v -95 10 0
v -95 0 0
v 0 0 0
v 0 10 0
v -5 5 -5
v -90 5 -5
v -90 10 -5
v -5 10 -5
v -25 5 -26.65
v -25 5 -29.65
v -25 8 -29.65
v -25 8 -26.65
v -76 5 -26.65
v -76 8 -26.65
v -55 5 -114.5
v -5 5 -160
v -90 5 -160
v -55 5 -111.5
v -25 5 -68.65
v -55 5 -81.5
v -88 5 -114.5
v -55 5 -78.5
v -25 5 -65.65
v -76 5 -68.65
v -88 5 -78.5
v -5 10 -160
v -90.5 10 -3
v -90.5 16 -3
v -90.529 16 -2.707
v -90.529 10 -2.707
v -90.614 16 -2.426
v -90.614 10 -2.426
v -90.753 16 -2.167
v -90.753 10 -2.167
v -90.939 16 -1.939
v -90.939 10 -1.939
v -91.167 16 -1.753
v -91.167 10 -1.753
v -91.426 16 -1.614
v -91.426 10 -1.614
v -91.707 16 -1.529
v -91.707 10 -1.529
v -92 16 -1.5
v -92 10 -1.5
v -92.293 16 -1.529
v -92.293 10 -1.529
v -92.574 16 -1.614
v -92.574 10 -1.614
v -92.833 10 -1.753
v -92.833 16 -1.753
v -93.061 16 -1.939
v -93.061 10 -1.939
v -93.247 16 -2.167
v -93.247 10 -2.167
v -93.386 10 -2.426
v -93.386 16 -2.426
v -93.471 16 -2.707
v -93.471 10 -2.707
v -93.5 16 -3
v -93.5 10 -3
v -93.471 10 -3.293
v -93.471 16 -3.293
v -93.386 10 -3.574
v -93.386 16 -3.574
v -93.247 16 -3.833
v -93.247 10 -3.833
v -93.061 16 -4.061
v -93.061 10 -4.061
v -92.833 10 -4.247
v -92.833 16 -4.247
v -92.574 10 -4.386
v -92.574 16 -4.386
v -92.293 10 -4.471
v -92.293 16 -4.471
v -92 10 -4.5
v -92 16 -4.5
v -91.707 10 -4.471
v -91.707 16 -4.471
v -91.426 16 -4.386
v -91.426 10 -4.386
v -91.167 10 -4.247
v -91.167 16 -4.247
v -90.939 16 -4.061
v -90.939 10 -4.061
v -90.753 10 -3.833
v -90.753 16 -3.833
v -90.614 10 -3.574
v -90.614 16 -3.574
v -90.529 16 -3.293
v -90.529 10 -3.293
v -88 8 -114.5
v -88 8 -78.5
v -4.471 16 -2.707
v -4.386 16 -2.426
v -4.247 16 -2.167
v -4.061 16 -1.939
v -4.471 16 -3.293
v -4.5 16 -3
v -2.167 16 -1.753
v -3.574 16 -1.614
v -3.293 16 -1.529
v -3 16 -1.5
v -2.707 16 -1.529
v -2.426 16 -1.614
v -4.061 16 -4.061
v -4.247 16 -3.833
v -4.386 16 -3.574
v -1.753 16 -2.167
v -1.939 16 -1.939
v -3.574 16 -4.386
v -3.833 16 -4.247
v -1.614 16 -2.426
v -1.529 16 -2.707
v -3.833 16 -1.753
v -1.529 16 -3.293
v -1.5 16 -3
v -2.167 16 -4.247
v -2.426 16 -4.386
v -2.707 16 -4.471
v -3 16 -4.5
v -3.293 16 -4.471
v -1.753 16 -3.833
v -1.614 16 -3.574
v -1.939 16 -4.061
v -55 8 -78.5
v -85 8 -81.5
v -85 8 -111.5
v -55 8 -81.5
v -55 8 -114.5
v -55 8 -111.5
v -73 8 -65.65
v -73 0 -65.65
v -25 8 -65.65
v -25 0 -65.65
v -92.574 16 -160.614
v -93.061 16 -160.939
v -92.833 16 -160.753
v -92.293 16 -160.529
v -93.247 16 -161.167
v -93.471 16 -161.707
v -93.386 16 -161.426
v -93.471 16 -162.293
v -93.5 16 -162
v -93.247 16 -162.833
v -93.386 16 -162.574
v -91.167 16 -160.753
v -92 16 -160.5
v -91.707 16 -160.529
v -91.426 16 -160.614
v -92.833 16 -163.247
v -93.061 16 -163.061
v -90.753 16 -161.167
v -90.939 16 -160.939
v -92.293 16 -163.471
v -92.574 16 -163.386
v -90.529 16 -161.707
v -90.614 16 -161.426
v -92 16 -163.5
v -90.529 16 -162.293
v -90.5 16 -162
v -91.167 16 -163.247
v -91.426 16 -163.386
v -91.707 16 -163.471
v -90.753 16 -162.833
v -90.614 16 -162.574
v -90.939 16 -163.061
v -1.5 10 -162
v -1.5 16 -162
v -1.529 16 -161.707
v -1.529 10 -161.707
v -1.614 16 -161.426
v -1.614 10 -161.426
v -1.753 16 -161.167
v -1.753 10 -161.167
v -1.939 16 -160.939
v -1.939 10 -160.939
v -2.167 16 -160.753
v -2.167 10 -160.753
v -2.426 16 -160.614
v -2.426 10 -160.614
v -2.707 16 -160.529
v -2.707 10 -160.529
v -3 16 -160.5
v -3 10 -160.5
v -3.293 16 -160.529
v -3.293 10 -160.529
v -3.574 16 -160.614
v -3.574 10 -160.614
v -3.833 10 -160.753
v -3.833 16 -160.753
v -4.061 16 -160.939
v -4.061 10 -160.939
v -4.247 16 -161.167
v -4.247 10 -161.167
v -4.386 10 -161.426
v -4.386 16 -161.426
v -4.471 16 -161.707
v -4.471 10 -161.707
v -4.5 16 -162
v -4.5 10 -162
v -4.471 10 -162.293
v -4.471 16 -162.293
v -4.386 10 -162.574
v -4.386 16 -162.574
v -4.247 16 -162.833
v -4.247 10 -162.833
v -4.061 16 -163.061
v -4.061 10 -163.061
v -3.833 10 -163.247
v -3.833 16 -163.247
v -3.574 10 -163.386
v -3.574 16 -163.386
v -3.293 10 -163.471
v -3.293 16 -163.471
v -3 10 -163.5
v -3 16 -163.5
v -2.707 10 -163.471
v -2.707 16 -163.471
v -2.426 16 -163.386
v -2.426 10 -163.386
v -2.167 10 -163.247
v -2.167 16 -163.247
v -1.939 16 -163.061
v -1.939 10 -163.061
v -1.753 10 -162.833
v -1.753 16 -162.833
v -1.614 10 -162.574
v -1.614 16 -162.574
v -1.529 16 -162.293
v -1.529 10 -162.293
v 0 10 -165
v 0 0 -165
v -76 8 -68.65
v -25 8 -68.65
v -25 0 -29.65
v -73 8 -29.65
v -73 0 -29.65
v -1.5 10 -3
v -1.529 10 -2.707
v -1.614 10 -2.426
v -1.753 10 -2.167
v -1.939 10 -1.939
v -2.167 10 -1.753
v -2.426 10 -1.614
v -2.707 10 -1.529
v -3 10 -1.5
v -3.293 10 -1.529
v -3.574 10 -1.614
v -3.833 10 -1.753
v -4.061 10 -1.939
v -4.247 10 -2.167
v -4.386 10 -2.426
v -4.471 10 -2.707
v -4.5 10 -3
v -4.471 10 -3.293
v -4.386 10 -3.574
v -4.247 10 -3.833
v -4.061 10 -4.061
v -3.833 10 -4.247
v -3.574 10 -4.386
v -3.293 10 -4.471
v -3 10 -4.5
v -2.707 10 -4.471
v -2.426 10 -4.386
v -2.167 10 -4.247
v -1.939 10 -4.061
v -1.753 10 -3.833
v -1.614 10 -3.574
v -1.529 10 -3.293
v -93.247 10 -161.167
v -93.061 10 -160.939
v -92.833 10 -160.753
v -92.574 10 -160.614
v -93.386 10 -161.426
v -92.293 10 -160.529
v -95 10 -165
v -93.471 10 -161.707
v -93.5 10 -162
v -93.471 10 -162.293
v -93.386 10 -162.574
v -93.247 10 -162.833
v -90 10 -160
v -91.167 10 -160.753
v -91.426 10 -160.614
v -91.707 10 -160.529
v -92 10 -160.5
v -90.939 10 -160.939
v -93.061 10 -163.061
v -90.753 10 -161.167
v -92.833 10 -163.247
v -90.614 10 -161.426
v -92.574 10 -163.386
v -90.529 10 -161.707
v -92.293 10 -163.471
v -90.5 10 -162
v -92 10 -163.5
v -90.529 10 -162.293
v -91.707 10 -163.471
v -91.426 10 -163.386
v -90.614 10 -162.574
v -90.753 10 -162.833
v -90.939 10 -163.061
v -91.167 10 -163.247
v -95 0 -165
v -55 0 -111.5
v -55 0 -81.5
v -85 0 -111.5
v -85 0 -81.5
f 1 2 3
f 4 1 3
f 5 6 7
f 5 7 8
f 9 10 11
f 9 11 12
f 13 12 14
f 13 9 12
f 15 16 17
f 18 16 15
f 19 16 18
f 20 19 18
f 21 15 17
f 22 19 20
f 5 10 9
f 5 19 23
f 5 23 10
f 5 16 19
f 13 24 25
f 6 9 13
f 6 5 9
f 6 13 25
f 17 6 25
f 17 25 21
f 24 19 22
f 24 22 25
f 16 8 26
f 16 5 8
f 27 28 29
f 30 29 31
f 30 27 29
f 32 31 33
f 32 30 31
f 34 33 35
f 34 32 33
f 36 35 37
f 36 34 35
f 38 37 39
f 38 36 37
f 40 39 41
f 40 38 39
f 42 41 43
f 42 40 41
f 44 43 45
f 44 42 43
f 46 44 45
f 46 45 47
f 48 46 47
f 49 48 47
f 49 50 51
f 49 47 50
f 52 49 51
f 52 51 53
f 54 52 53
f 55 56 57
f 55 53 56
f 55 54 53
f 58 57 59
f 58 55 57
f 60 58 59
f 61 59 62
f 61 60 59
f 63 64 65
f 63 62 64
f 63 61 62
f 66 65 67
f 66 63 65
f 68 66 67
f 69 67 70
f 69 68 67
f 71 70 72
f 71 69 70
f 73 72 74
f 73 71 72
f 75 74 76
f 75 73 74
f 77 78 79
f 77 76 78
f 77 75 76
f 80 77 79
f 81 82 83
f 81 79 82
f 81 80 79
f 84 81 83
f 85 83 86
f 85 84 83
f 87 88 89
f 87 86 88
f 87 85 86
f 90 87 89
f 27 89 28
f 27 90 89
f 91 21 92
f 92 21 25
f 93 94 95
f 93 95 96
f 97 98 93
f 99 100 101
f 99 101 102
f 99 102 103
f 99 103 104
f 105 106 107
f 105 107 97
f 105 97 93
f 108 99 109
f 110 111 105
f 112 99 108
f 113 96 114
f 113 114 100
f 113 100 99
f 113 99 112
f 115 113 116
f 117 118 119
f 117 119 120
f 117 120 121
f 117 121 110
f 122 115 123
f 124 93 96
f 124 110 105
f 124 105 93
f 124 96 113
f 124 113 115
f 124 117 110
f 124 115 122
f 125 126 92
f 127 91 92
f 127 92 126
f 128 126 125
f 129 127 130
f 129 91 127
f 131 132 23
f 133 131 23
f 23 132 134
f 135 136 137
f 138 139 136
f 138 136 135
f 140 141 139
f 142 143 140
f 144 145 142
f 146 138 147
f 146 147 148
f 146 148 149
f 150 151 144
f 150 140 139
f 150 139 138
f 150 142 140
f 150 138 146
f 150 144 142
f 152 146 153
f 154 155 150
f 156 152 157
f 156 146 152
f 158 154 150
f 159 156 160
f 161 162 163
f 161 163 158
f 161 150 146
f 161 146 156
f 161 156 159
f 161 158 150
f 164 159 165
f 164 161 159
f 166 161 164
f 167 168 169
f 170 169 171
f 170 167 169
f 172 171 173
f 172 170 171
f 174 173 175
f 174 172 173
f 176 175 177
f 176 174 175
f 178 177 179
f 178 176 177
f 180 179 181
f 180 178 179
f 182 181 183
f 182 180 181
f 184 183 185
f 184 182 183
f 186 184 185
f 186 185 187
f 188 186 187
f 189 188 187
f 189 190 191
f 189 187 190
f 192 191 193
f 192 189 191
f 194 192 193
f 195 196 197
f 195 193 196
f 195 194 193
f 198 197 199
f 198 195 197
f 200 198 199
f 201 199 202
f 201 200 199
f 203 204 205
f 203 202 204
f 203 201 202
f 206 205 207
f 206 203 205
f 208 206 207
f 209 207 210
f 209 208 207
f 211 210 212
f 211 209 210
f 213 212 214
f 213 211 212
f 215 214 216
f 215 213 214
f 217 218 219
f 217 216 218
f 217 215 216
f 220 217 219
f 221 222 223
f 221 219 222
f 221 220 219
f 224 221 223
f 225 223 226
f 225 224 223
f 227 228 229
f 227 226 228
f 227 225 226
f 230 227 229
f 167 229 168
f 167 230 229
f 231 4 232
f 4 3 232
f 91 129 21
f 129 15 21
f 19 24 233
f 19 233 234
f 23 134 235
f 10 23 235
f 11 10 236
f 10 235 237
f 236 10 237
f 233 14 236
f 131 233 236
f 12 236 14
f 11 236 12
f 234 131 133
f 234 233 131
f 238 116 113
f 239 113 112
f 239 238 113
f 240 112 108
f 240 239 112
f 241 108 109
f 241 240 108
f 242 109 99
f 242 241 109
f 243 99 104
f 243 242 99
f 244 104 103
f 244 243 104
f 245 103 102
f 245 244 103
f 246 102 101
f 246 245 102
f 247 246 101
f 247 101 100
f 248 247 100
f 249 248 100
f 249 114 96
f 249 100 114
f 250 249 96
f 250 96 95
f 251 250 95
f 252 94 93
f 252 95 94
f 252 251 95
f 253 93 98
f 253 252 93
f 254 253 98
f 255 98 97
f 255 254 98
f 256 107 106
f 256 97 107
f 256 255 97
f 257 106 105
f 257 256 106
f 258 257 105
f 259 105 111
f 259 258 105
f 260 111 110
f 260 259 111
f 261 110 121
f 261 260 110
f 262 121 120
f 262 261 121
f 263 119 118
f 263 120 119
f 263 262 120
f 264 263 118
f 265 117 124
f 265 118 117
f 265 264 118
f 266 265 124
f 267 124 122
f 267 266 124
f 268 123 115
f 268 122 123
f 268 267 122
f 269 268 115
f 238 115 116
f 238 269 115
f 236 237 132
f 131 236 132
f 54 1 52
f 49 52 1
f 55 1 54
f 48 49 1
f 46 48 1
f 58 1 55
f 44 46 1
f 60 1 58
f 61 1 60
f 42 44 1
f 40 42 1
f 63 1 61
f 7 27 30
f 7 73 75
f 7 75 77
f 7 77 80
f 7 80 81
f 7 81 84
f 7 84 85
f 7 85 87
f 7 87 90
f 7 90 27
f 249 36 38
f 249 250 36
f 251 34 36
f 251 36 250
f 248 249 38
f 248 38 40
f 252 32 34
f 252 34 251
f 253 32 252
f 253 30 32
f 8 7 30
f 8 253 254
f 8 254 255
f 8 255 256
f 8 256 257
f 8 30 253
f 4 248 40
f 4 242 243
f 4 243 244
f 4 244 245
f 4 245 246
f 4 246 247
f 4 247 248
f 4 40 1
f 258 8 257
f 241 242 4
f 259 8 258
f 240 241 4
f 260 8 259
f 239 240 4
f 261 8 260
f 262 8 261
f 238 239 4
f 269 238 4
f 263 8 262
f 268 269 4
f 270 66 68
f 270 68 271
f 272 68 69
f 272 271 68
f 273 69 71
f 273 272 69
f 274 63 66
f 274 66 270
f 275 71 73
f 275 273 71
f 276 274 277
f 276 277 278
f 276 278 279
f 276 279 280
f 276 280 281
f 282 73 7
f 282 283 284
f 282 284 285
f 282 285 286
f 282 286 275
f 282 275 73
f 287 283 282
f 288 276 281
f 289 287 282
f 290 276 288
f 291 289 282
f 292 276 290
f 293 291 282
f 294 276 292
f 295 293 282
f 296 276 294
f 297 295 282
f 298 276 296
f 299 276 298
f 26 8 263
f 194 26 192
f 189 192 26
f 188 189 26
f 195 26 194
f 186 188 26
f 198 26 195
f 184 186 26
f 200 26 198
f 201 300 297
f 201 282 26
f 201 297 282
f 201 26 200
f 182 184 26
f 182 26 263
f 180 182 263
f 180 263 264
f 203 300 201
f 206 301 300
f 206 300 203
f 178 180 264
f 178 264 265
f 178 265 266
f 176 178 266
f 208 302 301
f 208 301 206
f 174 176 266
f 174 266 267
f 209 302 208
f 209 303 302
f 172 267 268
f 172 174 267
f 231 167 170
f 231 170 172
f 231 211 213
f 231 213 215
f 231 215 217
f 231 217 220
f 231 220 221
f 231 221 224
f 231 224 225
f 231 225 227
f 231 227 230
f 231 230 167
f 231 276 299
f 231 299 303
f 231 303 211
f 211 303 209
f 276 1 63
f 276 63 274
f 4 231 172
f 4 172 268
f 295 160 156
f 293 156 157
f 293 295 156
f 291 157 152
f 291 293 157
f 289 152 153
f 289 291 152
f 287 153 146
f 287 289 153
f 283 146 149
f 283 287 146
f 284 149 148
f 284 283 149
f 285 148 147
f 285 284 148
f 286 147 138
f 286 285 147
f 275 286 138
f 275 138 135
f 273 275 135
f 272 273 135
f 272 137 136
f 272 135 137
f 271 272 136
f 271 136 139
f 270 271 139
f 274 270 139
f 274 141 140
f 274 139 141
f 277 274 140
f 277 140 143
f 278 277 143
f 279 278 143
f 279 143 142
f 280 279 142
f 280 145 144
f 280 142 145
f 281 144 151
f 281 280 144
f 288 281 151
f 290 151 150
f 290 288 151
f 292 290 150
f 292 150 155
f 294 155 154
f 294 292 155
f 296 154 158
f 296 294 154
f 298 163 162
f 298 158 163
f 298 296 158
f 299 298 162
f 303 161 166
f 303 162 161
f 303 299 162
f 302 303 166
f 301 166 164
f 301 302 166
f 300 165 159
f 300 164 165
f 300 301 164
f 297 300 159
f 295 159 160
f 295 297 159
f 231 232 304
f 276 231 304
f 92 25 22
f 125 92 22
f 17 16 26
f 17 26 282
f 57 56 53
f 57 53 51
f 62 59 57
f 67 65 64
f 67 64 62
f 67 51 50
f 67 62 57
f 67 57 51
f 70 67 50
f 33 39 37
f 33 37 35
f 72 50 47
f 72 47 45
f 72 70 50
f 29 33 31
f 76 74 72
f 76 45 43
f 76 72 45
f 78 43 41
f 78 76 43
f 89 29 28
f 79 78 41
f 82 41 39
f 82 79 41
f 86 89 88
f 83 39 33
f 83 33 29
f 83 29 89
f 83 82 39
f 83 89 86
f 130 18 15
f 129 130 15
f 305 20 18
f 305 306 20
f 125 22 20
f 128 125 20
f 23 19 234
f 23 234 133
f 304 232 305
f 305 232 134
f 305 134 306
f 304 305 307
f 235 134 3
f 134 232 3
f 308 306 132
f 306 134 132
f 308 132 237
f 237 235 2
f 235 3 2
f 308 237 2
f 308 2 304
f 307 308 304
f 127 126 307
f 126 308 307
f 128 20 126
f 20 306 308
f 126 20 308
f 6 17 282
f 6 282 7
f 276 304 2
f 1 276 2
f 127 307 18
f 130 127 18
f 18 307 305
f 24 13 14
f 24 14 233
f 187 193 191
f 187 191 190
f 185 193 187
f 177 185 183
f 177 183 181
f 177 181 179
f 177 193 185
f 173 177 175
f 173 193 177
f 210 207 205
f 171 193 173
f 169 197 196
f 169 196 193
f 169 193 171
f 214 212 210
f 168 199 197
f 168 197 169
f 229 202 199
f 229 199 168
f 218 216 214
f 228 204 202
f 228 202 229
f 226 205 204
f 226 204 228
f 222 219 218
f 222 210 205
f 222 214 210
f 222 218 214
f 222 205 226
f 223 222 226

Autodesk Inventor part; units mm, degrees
ref_plane "YZ Plane" through (0, 0, 0) normal (1, 0, 0) x (0, 1, 0)
ref_plane "XZ Plane" through (0, 0, 0) normal (0, 1, 0) x (-1, 0, 0)
ref_plane "XY Plane" through (0, 0, 0) normal (0, 0, 1) x (1, 0, 0)
sketch "草圖1" plane through (0, 0, 0) normal (0, 1, 0) x (-1, 0, 0)
  line L0 (0, 0) -> (95, 0)
  line L1 (95, 0) -> (95, -165)
  line L2 (95, -165) -> (0, -165)
  line L3 (0, -165) -> (0, 0)
  dimension "d0" = 95
  dimension "d1" = 165
extrude "擠出1" add sketch "草圖1" along normal blind 5
sketch "草圖2" plane through (0, 5, 0) normal (0, 1, 0) x (1, 0, 0)
  circle A0 centre (-3, 3) radius 1.5
  line L0 (0, 0) -> (0, 165) projected
  line L1 (-95, 0) -> (0, 0) projected
  circle A1 centre (-92, 3) radius 1.5
  line L2 (-95, 165) -> (-95, 0) projected
  circle A2 centre (-92, 162) radius 1.5
  line L3 (0, 165) -> (-95, 165) projected
  circle A3 centre (-3, 162) radius 1.5
  dimension "d4" = 3
  dimension "d5" = 3
  dimension "d6" = 3
  dimension "d7" = 3
  dimension "d8" = 3
  dimension "d9" = 3
  dimension "d10" = 3
  dimension "d11" = 3
  dimension "d12" = 3
  dimension "d13" = 3
  dimension "d14" = 3
  dimension "d15" = 3
extrude "擠出2" add sketch "草圖2" along normal blind 11 contours A0 | A1 | A2 | A3
sketch "草圖3" plane through (0, 0, 0) normal (0, -1, 0) x (1, 0, 0)
  line L0 (-25, -60.15) -> (-20, -60.15)
  line L1 (-20, -60.15) -> (-20, -35.15)
  line L2 (-20, -35.15) -> (-25, -35.15)
  line L3 (-25, -35.15) -> (-25, -60.15)
  line L4 (-95, 0) -> (0, 0) projected
  line L5 (0, 0) -> (0, -165) projected
  line L6 (-73, -65.65) -> (-25, -65.65)
  line L7 (-25, -65.65) -> (-25, -29.65)
  line L8 (-25, -29.65) -> (-73, -29.65)
  line L9 (-73, -29.65) -> (-73, -65.65)
  point P0 (-22.5, -35.15)
  point P1 (-20, -47.65)
  point P2 (-25, -47.65)
  dimension "d18" = 35.15
  dimension "d19" = 20
  dimension "d20" = 5
  dimension "d21" = 25
  dimension "d22" = 48
  dimension "d23" = 36
  dimension "d24" = 0
  dimension "d25" = 29.65
extrude "擠出3" cut sketch "草圖3" against normal blind 6 contours L7 L6 L9 L8 L3
sketch "草圖4" plane through (0, 0, 0) normal (0, -1, 0) x (1, 0, 0)
  line L0 (-85, -81.5) -> (-55, -81.5)
  line L1 (-55, -81.5) -> (-55, -111.5)
  line L2 (-55, -111.5) -> (-85, -111.5)
  line L3 (-85, -111.5) -> (-85, -81.5)
  line L4 (0, -165) -> (-95, -165) projected
  line L5 (-95, -165) -> (-95, 0) projected
  point P0 (0, 0)
  point P1 (-85, -96.5)
  dimension "d28" = 30
  dimension "d29" = 30
  dimension "d30" = 83.5
  dimension "d31" = 10
extrude "擠出4" cut sketch "草圖4" against normal blind 6
sketch "草圖5" plane through (0, 5, 0) normal (0, 1, 0) x (1, 0, 0)
  line L0 (-25, 26.65) -> (-76, 26.65)
  line L1 (-76, 26.65) -> (-76, 68.65)
  line L2 (-76, 68.65) -> (-25, 68.65)
  line L3 (-25, 68.65) -> (-25, 26.65)
  line L4 (-25, 29.65) -> (-73, 29.65) projected
  line L5 (-25, 65.65) -> (-25, 29.65) projected
  line L6 (-73, 65.65) -> (-25, 65.65) projected
  line L7 (-73, 29.65) -> (-73, 65.65) projected
  point P0 (0, 0)
  point P1 (-70, 65.65)
  point P2 (-70, 29.65)
  dimension "d34" = 3
  dimension "d35" = 0
  dimension "d36" = 3
  dimension "d40" = 3
extrude "擠出5" add sketch "草圖5" along normal blind 3 contours L0 L1 L2 L3 L6 L7 L4
sketch "草圖6" plane through (0, 5, 0) normal (0, 1, 0) x (1, 0, 0)
  line L0 (-88, 78.5) -> (-55, 78.5)
  line L1 (-55, 78.5) -> (-55, 114.5)
  line L2 (-55, 114.5) -> (-88, 114.5)
  line L3 (-88, 114.5) -> (-88, 78.5)
  line L4 (-85, 81.5) -> (-85, 111.5) projected
  line L5 (-55, 81.5) -> (-85, 81.5) projected
  line L6 (-85, 111.5) -> (-55, 111.5) projected
  line L7 (-55, 111.5) -> (-55, 81.5) projected
  point P0 (0, 0)
  dimension "d41" = 3
  dimension "d42" = 3
  dimension "d43" = 3
  dimension "d44" = 0
extrude "擠出6" add sketch "草圖6" along normal blind 3 contours L3 L2 L1 L6 L4 L5 L0
sketch "草圖7" plane through (0, 5, 0) normal (0, 1, 0) x (1, 0, 0)
  line L0 (-95, 0) -> (0, 0)
  line L1 (0, 0) -> (0, 165)
  line L2 (0, 165) -> (-95, 165)
  line L3 (-95, 165) -> (-95, 0)
  line L4 (-95, 165) -> (-95, 0) projected
  line L5 (0, 165) -> (-95, 165) projected
  line L6 (0, 0) -> (0, 165) projected
  line L7 (-95, 0) -> (0, 0) projected
  line L8 (-90, 5) -> (-5, 5)
  line L9 (-5, 5) -> (-5, 160)
  line L10 (-5, 160) -> (-90, 160)
  line L11 (-90, 160) -> (-90, 5)
  dimension "d47" = 5
  dimension "d48" = 5
  dimension "d49" = 5
  dimension "d50" = 5
extrude "擠出7" add sketch "草圖7" along normal blind 5
